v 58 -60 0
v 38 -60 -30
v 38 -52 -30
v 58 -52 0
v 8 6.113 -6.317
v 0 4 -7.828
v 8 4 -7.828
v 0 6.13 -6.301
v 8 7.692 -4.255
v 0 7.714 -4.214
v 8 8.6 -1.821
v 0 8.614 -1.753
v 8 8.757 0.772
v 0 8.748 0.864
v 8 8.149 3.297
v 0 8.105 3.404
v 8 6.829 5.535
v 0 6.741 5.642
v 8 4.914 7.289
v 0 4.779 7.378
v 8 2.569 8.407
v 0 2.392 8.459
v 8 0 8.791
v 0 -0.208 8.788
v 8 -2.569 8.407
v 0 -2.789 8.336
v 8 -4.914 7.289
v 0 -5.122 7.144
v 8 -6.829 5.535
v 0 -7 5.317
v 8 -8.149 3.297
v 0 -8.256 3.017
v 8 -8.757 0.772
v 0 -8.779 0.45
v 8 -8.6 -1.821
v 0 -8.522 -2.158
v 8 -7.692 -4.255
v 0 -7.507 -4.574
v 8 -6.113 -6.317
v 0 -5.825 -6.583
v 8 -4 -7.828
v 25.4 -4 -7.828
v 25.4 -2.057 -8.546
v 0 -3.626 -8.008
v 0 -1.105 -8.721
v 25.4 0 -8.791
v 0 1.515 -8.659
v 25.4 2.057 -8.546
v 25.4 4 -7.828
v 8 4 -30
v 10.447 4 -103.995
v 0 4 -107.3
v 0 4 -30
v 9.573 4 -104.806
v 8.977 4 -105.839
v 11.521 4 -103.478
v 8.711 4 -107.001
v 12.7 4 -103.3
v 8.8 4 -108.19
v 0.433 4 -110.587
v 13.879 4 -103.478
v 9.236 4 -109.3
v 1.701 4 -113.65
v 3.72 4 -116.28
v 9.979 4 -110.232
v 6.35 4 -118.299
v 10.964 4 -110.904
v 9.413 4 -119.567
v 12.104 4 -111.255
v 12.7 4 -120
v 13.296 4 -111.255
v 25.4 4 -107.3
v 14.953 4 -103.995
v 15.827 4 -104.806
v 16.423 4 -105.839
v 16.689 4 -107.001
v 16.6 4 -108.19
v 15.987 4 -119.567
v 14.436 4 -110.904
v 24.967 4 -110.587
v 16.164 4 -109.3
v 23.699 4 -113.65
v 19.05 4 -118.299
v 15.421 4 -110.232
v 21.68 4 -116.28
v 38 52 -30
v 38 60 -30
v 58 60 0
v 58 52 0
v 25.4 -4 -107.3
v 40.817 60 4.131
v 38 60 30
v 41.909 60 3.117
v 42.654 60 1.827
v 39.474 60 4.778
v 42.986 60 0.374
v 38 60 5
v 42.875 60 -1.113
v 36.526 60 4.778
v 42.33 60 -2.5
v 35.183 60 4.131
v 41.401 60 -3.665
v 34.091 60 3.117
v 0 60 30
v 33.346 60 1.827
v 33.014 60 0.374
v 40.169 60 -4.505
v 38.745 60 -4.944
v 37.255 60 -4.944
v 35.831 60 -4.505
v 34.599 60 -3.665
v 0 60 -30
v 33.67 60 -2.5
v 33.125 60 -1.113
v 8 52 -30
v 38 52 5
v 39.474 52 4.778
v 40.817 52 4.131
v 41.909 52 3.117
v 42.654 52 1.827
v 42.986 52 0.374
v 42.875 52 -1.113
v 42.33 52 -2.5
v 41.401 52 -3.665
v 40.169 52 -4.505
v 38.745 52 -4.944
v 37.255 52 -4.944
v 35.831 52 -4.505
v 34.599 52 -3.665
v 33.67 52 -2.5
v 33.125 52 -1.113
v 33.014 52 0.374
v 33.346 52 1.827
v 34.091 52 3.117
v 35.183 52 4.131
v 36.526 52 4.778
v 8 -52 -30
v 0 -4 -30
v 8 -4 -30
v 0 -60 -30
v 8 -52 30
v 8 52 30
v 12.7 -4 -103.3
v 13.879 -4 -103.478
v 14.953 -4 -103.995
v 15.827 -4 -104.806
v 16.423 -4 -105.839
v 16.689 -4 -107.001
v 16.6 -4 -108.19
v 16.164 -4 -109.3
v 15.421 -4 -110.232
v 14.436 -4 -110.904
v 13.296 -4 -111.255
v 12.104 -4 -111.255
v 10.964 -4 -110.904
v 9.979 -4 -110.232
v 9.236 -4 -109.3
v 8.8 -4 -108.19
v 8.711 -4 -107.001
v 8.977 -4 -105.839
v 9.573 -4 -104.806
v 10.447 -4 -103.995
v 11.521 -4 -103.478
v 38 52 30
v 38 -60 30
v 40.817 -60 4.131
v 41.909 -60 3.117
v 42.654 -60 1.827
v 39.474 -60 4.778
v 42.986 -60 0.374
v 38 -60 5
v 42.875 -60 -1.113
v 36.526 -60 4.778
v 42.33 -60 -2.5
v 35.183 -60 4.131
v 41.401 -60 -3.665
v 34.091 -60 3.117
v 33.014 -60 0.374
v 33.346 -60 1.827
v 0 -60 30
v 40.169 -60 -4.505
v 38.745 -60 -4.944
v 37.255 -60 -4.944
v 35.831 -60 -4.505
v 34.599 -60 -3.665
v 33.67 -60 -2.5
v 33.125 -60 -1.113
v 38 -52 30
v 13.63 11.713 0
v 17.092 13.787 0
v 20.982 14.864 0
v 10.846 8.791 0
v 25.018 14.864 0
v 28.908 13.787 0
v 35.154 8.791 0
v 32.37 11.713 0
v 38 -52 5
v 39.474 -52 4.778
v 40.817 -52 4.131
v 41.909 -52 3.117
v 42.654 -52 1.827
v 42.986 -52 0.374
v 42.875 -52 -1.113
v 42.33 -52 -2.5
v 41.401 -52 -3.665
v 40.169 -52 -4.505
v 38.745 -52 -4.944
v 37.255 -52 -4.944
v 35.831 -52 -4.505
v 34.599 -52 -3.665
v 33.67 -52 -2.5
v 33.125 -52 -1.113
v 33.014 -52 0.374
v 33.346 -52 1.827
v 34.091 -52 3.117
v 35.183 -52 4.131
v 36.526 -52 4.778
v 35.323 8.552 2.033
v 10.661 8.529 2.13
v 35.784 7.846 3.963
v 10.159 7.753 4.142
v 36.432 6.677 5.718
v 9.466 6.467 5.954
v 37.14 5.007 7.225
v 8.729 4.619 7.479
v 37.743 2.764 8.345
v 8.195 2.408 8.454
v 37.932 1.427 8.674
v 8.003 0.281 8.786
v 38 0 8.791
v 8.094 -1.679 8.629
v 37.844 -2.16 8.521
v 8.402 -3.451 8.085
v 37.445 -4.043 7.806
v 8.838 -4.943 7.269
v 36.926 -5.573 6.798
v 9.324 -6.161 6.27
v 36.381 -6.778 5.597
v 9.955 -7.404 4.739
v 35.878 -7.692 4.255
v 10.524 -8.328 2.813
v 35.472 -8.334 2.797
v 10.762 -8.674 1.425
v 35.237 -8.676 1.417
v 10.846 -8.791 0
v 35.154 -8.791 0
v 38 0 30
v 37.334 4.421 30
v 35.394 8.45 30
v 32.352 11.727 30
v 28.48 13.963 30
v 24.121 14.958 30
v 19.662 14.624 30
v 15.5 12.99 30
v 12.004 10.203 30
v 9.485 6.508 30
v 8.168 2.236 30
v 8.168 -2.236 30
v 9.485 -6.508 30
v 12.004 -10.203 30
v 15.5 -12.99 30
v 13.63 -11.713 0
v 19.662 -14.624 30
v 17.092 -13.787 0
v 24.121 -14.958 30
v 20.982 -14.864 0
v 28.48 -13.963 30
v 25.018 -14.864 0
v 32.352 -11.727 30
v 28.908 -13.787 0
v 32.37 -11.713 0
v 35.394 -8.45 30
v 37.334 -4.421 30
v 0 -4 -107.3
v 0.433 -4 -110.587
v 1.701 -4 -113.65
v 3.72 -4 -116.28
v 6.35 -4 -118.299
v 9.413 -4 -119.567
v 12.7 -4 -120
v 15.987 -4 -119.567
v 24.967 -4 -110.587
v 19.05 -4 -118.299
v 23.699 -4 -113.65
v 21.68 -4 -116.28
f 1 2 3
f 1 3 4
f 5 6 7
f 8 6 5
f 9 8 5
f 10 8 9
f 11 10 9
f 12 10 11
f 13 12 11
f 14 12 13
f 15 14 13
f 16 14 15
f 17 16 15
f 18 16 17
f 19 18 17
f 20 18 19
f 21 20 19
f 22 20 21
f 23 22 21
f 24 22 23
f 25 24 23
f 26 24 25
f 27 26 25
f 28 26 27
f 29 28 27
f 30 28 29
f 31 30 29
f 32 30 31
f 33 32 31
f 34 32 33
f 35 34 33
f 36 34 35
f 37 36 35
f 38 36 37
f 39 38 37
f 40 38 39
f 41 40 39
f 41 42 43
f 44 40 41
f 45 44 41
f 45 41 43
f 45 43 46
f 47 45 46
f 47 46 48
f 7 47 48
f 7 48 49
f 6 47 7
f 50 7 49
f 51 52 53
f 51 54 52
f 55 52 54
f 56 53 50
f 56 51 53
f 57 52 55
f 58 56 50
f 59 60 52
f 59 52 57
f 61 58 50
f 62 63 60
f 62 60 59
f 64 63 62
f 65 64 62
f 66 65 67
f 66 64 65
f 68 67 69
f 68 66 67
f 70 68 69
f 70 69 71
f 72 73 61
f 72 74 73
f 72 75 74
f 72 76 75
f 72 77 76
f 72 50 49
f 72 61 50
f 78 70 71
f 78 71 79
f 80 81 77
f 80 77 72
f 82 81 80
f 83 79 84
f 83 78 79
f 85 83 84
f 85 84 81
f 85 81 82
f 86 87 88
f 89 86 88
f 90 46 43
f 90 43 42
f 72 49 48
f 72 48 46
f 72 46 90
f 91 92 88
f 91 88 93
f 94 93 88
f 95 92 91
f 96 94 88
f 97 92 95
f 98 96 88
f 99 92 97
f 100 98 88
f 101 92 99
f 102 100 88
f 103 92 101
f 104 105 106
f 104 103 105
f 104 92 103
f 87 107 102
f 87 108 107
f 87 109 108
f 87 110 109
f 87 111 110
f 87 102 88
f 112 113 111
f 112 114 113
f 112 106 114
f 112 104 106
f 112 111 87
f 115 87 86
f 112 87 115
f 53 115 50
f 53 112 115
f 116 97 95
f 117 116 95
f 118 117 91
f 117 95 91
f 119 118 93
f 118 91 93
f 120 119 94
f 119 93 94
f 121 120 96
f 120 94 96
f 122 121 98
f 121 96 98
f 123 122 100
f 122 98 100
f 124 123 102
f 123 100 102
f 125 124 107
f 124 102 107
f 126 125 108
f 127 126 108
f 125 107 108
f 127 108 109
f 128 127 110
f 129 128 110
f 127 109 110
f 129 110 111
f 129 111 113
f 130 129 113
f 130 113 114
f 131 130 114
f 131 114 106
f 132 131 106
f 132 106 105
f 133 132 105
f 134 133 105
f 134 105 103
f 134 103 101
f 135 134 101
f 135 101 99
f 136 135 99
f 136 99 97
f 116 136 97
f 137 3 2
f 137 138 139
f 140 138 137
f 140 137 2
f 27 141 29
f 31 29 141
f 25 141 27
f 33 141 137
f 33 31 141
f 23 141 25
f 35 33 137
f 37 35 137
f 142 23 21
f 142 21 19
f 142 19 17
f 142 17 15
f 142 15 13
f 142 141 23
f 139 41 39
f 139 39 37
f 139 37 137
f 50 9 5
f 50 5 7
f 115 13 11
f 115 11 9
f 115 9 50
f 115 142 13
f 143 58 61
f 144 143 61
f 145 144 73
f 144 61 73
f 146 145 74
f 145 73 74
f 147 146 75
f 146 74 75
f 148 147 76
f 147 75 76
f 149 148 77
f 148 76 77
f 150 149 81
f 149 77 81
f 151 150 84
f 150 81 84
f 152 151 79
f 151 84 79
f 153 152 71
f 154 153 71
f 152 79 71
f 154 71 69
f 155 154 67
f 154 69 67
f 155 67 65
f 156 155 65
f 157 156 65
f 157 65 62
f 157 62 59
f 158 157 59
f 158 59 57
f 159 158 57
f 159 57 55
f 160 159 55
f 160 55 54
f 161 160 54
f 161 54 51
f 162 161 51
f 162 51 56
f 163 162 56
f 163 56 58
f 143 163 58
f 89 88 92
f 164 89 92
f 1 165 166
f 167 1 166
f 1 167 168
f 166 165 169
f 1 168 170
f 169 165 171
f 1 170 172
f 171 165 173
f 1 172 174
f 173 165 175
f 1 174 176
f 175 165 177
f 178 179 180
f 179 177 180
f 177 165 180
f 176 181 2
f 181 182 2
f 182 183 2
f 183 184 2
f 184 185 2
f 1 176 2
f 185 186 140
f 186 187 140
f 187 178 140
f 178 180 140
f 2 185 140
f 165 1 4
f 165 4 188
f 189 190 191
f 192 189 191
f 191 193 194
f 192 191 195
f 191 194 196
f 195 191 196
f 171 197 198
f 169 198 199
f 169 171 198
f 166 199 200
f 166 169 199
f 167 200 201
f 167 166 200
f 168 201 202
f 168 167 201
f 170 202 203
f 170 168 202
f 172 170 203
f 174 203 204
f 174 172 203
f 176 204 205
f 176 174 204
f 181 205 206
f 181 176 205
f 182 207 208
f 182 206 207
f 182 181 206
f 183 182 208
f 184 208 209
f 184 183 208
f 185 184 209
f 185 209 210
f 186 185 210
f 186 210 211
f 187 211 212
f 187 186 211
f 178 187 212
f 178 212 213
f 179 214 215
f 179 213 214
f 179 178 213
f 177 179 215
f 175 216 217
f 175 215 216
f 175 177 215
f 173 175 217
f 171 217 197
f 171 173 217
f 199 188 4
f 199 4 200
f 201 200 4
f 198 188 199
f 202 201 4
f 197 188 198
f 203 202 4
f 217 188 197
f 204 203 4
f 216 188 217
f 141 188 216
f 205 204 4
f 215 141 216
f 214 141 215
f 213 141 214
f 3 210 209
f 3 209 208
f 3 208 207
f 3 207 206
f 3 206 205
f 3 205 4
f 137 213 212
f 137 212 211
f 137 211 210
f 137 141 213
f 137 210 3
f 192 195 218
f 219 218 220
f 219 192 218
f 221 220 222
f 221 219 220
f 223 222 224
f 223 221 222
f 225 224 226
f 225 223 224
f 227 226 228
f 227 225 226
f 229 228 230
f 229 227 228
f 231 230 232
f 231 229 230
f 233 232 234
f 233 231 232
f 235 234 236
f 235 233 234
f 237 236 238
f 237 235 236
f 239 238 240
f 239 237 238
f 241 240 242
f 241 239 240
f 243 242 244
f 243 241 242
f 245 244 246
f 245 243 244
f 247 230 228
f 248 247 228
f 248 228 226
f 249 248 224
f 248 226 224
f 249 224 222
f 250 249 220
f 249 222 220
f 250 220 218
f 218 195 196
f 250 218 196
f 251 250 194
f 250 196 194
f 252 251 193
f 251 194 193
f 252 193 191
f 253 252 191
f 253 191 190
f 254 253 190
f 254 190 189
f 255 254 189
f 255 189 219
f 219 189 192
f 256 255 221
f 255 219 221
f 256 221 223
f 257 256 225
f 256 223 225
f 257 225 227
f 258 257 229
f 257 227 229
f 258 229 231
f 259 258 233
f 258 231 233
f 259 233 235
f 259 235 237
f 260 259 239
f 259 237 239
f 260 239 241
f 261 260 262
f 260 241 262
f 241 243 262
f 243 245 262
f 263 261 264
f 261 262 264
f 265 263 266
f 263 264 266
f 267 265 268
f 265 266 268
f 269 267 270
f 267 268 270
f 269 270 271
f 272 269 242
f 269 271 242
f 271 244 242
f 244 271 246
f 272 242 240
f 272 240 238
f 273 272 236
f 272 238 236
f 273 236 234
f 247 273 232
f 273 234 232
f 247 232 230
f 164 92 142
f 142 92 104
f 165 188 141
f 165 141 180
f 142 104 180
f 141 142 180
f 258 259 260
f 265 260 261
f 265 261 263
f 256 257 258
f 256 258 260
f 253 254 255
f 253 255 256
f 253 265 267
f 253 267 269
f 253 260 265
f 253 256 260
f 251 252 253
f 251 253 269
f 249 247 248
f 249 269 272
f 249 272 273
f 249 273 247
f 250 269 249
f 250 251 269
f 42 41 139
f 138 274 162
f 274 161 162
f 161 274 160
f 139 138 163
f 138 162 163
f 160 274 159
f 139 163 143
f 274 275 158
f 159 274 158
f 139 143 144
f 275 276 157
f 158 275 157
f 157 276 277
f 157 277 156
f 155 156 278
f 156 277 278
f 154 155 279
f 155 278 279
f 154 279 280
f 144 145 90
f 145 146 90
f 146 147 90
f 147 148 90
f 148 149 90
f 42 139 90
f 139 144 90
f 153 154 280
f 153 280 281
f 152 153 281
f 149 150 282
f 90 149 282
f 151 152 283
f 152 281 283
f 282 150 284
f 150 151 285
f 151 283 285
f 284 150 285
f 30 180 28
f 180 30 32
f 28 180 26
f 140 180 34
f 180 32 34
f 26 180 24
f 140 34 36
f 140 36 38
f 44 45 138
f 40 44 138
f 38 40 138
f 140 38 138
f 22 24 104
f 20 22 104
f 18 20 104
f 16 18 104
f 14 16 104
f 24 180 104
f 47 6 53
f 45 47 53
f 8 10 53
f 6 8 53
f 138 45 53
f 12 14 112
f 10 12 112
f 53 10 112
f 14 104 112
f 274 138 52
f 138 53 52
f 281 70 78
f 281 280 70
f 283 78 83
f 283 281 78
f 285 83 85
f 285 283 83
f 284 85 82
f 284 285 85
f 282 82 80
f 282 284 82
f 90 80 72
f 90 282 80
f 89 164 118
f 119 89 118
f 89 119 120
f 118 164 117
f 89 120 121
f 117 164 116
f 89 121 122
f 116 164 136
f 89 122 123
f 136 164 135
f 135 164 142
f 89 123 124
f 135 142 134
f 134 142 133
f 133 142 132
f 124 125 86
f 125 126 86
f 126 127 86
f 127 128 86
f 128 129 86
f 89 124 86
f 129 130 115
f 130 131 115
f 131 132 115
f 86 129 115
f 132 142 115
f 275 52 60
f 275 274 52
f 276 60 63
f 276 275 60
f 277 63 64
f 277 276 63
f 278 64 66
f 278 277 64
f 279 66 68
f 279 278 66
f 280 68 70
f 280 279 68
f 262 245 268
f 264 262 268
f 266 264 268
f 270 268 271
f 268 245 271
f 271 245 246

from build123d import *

# Parameters (mm, degrees)
SKETCH2_W               = 60
SKETCH2_H               = 120
BOSS_EXTRUDE1_DEPTH     = 8
SKETCH3_W               = 60
SKETCH3_H               = 8
BOSS_EXTRUDE2_DEPTH     = 50
CUT_EXTRUDE1_DEPTH      = 50
SKETCH5_R               = 5
CUT_EXTRUDE2_DEPTH      = 137.616250864
SKETCH7_W               = 25.4
SKETCH7_H               = 120
BOSS_EXTRUDE3_DEPTH     = 4
FILLET1_R               = 12.7
SKETCH9_R               = 4
CUT_EXTRUDE4_DEPTH      = 148.851276626
SKETCH11_R              = 15
BOSS_EXTRUDE4_DEPTH     = 30
CUT_EXTRUDE3_DEPTH      = 144.178210633
CUT_EXTRUDE3_DEPTH_BACK = 144.178210633
SKETCH6_R               = 8.790541624


with BuildPart() as part:
    # Sketch2 → Boss-Extrude1 (new body)
    with BuildSketch(Plane(origin=(0, 0, 0), x_dir=(0, 0, -1), z_dir=(1, 0, 0))):
        Rectangle(SKETCH2_W, SKETCH2_H)
    extrude(amount=BOSS_EXTRUDE1_DEPTH)

    # Sketch3 → Boss-Extrude2 (add)
    with BuildSketch(Plane(origin=(8, 0, 0), x_dir=(0, 0, -1), z_dir=(1, 0, 0))):
        with Locations((0, 56)):
            Rectangle(SKETCH3_W, SKETCH3_H)
    boss_extrude2 = extrude(amount=BOSS_EXTRUDE2_DEPTH)

    # Sketch4 → Cut-Extrude1 (cut)
    with BuildSketch(Plane(origin=(0, 60, 0), x_dir=(1, 0, 0), z_dir=(0, 1, 0))):
        Polygon((38, 30), (58, 0), (58, 30), align=None)
        Polygon((58, -30), (58, 0), (38, -30), align=None)
    cut_extrude1 = extrude(amount=-CUT_EXTRUDE1_DEPTH, mode=Mode.SUBTRACT)

    # Sketch5 → Cut-Extrude2 (cut, through all)
    with BuildSketch(Plane(origin=(0, 60, 0), x_dir=(1, 0, 0), z_dir=(0, 1, 0))):
        with Locations(Location((38, 0, 0), (0, 0, 270))):
            Circle(SKETCH5_R)
    cut_extrude2 = extrude(amount=-CUT_EXTRUDE2_DEPTH, mode=Mode.SUBTRACT)

    # Mirror1: Boss-Extrude2, Cut-Extrude1, Cut-Extrude2 across plane
    add(boss_extrude2.mirror(Plane.ZX))
    add(cut_extrude1.mirror(Plane.ZX), mode=Mode.SUBTRACT)
    add(cut_extrude2.mirror(Plane.ZX), mode=Mode.SUBTRACT)

    # Sketch7 → Boss-Extrude3 (add, symmetric)
    with BuildSketch(Plane(origin=(0, 0, 0), x_dir=(1, 0, 0), z_dir=(0, 1, 0))):
        with Locations((12.7, 60)):
            Rectangle(SKETCH7_W, SKETCH7_H)
    extrude(amount=BOSS_EXTRUDE3_DEPTH, both=True)

    # Fillet1
    fillet1_edges = [part.edges().sort_by_distance(p)[0] for p in [
        (0, 0, -120),
        (25.4, 0, -120),
    ]]
    fillet(fillet1_edges, radius=FILLET1_R - 0.0001)  # a hair under: the kernel refuses the full size

    # Sketch9 → Cut-Extrude4 (cut, through all)
    with BuildSketch(Plane(origin=(0, 4, 0), x_dir=(1, 0, 0), z_dir=(0, 1, 0))):
        with Locations(Location((12.7, 107.3, 0), (0, 0, 270))):
            Circle(SKETCH9_R)
    extrude(amount=-CUT_EXTRUDE4_DEPTH, mode=Mode.SUBTRACT)


with BuildPart() as body_2:
    # Sketch11 → Boss-Extrude4 (new body)
    with BuildSketch(Plane.XY):
        with Locations((23, 0)):
            Circle(SKETCH11_R)
    extrude(amount=BOSS_EXTRUDE4_DEPTH)


with BuildPart() as cut_extrude3_tool:
    # Sketch6 → Cut-Extrude3 (new, two sides: drawn at the far end of the back side and taken through both)
    with BuildSketch(Plane(origin=(8, 0, 0), x_dir=(0, 0, -1), z_dir=(1, 0, 0)).offset(-CUT_EXTRUDE3_DEPTH_BACK)):
        with Locations(Location((0, 0, 0), (0, 0, 27.067156143))):
            Circle(SKETCH6_R)
    extrude(amount=CUT_EXTRUDE3_DEPTH + CUT_EXTRUDE3_DEPTH_BACK)


with BuildPart() as part_1:
    add(part.part)

    # Cut-Extrude3: cut by cut_extrude3_tool
    add(cut_extrude3_tool.part, mode=Mode.SUBTRACT)


with BuildPart() as body_2_1:
    add(body_2.part)

    # Cut-Extrude3: cut by cut_extrude3_tool
    add(cut_extrude3_tool.part, mode=Mode.SUBTRACT)


solid = Compound([part_1.part, body_2_1.part])
